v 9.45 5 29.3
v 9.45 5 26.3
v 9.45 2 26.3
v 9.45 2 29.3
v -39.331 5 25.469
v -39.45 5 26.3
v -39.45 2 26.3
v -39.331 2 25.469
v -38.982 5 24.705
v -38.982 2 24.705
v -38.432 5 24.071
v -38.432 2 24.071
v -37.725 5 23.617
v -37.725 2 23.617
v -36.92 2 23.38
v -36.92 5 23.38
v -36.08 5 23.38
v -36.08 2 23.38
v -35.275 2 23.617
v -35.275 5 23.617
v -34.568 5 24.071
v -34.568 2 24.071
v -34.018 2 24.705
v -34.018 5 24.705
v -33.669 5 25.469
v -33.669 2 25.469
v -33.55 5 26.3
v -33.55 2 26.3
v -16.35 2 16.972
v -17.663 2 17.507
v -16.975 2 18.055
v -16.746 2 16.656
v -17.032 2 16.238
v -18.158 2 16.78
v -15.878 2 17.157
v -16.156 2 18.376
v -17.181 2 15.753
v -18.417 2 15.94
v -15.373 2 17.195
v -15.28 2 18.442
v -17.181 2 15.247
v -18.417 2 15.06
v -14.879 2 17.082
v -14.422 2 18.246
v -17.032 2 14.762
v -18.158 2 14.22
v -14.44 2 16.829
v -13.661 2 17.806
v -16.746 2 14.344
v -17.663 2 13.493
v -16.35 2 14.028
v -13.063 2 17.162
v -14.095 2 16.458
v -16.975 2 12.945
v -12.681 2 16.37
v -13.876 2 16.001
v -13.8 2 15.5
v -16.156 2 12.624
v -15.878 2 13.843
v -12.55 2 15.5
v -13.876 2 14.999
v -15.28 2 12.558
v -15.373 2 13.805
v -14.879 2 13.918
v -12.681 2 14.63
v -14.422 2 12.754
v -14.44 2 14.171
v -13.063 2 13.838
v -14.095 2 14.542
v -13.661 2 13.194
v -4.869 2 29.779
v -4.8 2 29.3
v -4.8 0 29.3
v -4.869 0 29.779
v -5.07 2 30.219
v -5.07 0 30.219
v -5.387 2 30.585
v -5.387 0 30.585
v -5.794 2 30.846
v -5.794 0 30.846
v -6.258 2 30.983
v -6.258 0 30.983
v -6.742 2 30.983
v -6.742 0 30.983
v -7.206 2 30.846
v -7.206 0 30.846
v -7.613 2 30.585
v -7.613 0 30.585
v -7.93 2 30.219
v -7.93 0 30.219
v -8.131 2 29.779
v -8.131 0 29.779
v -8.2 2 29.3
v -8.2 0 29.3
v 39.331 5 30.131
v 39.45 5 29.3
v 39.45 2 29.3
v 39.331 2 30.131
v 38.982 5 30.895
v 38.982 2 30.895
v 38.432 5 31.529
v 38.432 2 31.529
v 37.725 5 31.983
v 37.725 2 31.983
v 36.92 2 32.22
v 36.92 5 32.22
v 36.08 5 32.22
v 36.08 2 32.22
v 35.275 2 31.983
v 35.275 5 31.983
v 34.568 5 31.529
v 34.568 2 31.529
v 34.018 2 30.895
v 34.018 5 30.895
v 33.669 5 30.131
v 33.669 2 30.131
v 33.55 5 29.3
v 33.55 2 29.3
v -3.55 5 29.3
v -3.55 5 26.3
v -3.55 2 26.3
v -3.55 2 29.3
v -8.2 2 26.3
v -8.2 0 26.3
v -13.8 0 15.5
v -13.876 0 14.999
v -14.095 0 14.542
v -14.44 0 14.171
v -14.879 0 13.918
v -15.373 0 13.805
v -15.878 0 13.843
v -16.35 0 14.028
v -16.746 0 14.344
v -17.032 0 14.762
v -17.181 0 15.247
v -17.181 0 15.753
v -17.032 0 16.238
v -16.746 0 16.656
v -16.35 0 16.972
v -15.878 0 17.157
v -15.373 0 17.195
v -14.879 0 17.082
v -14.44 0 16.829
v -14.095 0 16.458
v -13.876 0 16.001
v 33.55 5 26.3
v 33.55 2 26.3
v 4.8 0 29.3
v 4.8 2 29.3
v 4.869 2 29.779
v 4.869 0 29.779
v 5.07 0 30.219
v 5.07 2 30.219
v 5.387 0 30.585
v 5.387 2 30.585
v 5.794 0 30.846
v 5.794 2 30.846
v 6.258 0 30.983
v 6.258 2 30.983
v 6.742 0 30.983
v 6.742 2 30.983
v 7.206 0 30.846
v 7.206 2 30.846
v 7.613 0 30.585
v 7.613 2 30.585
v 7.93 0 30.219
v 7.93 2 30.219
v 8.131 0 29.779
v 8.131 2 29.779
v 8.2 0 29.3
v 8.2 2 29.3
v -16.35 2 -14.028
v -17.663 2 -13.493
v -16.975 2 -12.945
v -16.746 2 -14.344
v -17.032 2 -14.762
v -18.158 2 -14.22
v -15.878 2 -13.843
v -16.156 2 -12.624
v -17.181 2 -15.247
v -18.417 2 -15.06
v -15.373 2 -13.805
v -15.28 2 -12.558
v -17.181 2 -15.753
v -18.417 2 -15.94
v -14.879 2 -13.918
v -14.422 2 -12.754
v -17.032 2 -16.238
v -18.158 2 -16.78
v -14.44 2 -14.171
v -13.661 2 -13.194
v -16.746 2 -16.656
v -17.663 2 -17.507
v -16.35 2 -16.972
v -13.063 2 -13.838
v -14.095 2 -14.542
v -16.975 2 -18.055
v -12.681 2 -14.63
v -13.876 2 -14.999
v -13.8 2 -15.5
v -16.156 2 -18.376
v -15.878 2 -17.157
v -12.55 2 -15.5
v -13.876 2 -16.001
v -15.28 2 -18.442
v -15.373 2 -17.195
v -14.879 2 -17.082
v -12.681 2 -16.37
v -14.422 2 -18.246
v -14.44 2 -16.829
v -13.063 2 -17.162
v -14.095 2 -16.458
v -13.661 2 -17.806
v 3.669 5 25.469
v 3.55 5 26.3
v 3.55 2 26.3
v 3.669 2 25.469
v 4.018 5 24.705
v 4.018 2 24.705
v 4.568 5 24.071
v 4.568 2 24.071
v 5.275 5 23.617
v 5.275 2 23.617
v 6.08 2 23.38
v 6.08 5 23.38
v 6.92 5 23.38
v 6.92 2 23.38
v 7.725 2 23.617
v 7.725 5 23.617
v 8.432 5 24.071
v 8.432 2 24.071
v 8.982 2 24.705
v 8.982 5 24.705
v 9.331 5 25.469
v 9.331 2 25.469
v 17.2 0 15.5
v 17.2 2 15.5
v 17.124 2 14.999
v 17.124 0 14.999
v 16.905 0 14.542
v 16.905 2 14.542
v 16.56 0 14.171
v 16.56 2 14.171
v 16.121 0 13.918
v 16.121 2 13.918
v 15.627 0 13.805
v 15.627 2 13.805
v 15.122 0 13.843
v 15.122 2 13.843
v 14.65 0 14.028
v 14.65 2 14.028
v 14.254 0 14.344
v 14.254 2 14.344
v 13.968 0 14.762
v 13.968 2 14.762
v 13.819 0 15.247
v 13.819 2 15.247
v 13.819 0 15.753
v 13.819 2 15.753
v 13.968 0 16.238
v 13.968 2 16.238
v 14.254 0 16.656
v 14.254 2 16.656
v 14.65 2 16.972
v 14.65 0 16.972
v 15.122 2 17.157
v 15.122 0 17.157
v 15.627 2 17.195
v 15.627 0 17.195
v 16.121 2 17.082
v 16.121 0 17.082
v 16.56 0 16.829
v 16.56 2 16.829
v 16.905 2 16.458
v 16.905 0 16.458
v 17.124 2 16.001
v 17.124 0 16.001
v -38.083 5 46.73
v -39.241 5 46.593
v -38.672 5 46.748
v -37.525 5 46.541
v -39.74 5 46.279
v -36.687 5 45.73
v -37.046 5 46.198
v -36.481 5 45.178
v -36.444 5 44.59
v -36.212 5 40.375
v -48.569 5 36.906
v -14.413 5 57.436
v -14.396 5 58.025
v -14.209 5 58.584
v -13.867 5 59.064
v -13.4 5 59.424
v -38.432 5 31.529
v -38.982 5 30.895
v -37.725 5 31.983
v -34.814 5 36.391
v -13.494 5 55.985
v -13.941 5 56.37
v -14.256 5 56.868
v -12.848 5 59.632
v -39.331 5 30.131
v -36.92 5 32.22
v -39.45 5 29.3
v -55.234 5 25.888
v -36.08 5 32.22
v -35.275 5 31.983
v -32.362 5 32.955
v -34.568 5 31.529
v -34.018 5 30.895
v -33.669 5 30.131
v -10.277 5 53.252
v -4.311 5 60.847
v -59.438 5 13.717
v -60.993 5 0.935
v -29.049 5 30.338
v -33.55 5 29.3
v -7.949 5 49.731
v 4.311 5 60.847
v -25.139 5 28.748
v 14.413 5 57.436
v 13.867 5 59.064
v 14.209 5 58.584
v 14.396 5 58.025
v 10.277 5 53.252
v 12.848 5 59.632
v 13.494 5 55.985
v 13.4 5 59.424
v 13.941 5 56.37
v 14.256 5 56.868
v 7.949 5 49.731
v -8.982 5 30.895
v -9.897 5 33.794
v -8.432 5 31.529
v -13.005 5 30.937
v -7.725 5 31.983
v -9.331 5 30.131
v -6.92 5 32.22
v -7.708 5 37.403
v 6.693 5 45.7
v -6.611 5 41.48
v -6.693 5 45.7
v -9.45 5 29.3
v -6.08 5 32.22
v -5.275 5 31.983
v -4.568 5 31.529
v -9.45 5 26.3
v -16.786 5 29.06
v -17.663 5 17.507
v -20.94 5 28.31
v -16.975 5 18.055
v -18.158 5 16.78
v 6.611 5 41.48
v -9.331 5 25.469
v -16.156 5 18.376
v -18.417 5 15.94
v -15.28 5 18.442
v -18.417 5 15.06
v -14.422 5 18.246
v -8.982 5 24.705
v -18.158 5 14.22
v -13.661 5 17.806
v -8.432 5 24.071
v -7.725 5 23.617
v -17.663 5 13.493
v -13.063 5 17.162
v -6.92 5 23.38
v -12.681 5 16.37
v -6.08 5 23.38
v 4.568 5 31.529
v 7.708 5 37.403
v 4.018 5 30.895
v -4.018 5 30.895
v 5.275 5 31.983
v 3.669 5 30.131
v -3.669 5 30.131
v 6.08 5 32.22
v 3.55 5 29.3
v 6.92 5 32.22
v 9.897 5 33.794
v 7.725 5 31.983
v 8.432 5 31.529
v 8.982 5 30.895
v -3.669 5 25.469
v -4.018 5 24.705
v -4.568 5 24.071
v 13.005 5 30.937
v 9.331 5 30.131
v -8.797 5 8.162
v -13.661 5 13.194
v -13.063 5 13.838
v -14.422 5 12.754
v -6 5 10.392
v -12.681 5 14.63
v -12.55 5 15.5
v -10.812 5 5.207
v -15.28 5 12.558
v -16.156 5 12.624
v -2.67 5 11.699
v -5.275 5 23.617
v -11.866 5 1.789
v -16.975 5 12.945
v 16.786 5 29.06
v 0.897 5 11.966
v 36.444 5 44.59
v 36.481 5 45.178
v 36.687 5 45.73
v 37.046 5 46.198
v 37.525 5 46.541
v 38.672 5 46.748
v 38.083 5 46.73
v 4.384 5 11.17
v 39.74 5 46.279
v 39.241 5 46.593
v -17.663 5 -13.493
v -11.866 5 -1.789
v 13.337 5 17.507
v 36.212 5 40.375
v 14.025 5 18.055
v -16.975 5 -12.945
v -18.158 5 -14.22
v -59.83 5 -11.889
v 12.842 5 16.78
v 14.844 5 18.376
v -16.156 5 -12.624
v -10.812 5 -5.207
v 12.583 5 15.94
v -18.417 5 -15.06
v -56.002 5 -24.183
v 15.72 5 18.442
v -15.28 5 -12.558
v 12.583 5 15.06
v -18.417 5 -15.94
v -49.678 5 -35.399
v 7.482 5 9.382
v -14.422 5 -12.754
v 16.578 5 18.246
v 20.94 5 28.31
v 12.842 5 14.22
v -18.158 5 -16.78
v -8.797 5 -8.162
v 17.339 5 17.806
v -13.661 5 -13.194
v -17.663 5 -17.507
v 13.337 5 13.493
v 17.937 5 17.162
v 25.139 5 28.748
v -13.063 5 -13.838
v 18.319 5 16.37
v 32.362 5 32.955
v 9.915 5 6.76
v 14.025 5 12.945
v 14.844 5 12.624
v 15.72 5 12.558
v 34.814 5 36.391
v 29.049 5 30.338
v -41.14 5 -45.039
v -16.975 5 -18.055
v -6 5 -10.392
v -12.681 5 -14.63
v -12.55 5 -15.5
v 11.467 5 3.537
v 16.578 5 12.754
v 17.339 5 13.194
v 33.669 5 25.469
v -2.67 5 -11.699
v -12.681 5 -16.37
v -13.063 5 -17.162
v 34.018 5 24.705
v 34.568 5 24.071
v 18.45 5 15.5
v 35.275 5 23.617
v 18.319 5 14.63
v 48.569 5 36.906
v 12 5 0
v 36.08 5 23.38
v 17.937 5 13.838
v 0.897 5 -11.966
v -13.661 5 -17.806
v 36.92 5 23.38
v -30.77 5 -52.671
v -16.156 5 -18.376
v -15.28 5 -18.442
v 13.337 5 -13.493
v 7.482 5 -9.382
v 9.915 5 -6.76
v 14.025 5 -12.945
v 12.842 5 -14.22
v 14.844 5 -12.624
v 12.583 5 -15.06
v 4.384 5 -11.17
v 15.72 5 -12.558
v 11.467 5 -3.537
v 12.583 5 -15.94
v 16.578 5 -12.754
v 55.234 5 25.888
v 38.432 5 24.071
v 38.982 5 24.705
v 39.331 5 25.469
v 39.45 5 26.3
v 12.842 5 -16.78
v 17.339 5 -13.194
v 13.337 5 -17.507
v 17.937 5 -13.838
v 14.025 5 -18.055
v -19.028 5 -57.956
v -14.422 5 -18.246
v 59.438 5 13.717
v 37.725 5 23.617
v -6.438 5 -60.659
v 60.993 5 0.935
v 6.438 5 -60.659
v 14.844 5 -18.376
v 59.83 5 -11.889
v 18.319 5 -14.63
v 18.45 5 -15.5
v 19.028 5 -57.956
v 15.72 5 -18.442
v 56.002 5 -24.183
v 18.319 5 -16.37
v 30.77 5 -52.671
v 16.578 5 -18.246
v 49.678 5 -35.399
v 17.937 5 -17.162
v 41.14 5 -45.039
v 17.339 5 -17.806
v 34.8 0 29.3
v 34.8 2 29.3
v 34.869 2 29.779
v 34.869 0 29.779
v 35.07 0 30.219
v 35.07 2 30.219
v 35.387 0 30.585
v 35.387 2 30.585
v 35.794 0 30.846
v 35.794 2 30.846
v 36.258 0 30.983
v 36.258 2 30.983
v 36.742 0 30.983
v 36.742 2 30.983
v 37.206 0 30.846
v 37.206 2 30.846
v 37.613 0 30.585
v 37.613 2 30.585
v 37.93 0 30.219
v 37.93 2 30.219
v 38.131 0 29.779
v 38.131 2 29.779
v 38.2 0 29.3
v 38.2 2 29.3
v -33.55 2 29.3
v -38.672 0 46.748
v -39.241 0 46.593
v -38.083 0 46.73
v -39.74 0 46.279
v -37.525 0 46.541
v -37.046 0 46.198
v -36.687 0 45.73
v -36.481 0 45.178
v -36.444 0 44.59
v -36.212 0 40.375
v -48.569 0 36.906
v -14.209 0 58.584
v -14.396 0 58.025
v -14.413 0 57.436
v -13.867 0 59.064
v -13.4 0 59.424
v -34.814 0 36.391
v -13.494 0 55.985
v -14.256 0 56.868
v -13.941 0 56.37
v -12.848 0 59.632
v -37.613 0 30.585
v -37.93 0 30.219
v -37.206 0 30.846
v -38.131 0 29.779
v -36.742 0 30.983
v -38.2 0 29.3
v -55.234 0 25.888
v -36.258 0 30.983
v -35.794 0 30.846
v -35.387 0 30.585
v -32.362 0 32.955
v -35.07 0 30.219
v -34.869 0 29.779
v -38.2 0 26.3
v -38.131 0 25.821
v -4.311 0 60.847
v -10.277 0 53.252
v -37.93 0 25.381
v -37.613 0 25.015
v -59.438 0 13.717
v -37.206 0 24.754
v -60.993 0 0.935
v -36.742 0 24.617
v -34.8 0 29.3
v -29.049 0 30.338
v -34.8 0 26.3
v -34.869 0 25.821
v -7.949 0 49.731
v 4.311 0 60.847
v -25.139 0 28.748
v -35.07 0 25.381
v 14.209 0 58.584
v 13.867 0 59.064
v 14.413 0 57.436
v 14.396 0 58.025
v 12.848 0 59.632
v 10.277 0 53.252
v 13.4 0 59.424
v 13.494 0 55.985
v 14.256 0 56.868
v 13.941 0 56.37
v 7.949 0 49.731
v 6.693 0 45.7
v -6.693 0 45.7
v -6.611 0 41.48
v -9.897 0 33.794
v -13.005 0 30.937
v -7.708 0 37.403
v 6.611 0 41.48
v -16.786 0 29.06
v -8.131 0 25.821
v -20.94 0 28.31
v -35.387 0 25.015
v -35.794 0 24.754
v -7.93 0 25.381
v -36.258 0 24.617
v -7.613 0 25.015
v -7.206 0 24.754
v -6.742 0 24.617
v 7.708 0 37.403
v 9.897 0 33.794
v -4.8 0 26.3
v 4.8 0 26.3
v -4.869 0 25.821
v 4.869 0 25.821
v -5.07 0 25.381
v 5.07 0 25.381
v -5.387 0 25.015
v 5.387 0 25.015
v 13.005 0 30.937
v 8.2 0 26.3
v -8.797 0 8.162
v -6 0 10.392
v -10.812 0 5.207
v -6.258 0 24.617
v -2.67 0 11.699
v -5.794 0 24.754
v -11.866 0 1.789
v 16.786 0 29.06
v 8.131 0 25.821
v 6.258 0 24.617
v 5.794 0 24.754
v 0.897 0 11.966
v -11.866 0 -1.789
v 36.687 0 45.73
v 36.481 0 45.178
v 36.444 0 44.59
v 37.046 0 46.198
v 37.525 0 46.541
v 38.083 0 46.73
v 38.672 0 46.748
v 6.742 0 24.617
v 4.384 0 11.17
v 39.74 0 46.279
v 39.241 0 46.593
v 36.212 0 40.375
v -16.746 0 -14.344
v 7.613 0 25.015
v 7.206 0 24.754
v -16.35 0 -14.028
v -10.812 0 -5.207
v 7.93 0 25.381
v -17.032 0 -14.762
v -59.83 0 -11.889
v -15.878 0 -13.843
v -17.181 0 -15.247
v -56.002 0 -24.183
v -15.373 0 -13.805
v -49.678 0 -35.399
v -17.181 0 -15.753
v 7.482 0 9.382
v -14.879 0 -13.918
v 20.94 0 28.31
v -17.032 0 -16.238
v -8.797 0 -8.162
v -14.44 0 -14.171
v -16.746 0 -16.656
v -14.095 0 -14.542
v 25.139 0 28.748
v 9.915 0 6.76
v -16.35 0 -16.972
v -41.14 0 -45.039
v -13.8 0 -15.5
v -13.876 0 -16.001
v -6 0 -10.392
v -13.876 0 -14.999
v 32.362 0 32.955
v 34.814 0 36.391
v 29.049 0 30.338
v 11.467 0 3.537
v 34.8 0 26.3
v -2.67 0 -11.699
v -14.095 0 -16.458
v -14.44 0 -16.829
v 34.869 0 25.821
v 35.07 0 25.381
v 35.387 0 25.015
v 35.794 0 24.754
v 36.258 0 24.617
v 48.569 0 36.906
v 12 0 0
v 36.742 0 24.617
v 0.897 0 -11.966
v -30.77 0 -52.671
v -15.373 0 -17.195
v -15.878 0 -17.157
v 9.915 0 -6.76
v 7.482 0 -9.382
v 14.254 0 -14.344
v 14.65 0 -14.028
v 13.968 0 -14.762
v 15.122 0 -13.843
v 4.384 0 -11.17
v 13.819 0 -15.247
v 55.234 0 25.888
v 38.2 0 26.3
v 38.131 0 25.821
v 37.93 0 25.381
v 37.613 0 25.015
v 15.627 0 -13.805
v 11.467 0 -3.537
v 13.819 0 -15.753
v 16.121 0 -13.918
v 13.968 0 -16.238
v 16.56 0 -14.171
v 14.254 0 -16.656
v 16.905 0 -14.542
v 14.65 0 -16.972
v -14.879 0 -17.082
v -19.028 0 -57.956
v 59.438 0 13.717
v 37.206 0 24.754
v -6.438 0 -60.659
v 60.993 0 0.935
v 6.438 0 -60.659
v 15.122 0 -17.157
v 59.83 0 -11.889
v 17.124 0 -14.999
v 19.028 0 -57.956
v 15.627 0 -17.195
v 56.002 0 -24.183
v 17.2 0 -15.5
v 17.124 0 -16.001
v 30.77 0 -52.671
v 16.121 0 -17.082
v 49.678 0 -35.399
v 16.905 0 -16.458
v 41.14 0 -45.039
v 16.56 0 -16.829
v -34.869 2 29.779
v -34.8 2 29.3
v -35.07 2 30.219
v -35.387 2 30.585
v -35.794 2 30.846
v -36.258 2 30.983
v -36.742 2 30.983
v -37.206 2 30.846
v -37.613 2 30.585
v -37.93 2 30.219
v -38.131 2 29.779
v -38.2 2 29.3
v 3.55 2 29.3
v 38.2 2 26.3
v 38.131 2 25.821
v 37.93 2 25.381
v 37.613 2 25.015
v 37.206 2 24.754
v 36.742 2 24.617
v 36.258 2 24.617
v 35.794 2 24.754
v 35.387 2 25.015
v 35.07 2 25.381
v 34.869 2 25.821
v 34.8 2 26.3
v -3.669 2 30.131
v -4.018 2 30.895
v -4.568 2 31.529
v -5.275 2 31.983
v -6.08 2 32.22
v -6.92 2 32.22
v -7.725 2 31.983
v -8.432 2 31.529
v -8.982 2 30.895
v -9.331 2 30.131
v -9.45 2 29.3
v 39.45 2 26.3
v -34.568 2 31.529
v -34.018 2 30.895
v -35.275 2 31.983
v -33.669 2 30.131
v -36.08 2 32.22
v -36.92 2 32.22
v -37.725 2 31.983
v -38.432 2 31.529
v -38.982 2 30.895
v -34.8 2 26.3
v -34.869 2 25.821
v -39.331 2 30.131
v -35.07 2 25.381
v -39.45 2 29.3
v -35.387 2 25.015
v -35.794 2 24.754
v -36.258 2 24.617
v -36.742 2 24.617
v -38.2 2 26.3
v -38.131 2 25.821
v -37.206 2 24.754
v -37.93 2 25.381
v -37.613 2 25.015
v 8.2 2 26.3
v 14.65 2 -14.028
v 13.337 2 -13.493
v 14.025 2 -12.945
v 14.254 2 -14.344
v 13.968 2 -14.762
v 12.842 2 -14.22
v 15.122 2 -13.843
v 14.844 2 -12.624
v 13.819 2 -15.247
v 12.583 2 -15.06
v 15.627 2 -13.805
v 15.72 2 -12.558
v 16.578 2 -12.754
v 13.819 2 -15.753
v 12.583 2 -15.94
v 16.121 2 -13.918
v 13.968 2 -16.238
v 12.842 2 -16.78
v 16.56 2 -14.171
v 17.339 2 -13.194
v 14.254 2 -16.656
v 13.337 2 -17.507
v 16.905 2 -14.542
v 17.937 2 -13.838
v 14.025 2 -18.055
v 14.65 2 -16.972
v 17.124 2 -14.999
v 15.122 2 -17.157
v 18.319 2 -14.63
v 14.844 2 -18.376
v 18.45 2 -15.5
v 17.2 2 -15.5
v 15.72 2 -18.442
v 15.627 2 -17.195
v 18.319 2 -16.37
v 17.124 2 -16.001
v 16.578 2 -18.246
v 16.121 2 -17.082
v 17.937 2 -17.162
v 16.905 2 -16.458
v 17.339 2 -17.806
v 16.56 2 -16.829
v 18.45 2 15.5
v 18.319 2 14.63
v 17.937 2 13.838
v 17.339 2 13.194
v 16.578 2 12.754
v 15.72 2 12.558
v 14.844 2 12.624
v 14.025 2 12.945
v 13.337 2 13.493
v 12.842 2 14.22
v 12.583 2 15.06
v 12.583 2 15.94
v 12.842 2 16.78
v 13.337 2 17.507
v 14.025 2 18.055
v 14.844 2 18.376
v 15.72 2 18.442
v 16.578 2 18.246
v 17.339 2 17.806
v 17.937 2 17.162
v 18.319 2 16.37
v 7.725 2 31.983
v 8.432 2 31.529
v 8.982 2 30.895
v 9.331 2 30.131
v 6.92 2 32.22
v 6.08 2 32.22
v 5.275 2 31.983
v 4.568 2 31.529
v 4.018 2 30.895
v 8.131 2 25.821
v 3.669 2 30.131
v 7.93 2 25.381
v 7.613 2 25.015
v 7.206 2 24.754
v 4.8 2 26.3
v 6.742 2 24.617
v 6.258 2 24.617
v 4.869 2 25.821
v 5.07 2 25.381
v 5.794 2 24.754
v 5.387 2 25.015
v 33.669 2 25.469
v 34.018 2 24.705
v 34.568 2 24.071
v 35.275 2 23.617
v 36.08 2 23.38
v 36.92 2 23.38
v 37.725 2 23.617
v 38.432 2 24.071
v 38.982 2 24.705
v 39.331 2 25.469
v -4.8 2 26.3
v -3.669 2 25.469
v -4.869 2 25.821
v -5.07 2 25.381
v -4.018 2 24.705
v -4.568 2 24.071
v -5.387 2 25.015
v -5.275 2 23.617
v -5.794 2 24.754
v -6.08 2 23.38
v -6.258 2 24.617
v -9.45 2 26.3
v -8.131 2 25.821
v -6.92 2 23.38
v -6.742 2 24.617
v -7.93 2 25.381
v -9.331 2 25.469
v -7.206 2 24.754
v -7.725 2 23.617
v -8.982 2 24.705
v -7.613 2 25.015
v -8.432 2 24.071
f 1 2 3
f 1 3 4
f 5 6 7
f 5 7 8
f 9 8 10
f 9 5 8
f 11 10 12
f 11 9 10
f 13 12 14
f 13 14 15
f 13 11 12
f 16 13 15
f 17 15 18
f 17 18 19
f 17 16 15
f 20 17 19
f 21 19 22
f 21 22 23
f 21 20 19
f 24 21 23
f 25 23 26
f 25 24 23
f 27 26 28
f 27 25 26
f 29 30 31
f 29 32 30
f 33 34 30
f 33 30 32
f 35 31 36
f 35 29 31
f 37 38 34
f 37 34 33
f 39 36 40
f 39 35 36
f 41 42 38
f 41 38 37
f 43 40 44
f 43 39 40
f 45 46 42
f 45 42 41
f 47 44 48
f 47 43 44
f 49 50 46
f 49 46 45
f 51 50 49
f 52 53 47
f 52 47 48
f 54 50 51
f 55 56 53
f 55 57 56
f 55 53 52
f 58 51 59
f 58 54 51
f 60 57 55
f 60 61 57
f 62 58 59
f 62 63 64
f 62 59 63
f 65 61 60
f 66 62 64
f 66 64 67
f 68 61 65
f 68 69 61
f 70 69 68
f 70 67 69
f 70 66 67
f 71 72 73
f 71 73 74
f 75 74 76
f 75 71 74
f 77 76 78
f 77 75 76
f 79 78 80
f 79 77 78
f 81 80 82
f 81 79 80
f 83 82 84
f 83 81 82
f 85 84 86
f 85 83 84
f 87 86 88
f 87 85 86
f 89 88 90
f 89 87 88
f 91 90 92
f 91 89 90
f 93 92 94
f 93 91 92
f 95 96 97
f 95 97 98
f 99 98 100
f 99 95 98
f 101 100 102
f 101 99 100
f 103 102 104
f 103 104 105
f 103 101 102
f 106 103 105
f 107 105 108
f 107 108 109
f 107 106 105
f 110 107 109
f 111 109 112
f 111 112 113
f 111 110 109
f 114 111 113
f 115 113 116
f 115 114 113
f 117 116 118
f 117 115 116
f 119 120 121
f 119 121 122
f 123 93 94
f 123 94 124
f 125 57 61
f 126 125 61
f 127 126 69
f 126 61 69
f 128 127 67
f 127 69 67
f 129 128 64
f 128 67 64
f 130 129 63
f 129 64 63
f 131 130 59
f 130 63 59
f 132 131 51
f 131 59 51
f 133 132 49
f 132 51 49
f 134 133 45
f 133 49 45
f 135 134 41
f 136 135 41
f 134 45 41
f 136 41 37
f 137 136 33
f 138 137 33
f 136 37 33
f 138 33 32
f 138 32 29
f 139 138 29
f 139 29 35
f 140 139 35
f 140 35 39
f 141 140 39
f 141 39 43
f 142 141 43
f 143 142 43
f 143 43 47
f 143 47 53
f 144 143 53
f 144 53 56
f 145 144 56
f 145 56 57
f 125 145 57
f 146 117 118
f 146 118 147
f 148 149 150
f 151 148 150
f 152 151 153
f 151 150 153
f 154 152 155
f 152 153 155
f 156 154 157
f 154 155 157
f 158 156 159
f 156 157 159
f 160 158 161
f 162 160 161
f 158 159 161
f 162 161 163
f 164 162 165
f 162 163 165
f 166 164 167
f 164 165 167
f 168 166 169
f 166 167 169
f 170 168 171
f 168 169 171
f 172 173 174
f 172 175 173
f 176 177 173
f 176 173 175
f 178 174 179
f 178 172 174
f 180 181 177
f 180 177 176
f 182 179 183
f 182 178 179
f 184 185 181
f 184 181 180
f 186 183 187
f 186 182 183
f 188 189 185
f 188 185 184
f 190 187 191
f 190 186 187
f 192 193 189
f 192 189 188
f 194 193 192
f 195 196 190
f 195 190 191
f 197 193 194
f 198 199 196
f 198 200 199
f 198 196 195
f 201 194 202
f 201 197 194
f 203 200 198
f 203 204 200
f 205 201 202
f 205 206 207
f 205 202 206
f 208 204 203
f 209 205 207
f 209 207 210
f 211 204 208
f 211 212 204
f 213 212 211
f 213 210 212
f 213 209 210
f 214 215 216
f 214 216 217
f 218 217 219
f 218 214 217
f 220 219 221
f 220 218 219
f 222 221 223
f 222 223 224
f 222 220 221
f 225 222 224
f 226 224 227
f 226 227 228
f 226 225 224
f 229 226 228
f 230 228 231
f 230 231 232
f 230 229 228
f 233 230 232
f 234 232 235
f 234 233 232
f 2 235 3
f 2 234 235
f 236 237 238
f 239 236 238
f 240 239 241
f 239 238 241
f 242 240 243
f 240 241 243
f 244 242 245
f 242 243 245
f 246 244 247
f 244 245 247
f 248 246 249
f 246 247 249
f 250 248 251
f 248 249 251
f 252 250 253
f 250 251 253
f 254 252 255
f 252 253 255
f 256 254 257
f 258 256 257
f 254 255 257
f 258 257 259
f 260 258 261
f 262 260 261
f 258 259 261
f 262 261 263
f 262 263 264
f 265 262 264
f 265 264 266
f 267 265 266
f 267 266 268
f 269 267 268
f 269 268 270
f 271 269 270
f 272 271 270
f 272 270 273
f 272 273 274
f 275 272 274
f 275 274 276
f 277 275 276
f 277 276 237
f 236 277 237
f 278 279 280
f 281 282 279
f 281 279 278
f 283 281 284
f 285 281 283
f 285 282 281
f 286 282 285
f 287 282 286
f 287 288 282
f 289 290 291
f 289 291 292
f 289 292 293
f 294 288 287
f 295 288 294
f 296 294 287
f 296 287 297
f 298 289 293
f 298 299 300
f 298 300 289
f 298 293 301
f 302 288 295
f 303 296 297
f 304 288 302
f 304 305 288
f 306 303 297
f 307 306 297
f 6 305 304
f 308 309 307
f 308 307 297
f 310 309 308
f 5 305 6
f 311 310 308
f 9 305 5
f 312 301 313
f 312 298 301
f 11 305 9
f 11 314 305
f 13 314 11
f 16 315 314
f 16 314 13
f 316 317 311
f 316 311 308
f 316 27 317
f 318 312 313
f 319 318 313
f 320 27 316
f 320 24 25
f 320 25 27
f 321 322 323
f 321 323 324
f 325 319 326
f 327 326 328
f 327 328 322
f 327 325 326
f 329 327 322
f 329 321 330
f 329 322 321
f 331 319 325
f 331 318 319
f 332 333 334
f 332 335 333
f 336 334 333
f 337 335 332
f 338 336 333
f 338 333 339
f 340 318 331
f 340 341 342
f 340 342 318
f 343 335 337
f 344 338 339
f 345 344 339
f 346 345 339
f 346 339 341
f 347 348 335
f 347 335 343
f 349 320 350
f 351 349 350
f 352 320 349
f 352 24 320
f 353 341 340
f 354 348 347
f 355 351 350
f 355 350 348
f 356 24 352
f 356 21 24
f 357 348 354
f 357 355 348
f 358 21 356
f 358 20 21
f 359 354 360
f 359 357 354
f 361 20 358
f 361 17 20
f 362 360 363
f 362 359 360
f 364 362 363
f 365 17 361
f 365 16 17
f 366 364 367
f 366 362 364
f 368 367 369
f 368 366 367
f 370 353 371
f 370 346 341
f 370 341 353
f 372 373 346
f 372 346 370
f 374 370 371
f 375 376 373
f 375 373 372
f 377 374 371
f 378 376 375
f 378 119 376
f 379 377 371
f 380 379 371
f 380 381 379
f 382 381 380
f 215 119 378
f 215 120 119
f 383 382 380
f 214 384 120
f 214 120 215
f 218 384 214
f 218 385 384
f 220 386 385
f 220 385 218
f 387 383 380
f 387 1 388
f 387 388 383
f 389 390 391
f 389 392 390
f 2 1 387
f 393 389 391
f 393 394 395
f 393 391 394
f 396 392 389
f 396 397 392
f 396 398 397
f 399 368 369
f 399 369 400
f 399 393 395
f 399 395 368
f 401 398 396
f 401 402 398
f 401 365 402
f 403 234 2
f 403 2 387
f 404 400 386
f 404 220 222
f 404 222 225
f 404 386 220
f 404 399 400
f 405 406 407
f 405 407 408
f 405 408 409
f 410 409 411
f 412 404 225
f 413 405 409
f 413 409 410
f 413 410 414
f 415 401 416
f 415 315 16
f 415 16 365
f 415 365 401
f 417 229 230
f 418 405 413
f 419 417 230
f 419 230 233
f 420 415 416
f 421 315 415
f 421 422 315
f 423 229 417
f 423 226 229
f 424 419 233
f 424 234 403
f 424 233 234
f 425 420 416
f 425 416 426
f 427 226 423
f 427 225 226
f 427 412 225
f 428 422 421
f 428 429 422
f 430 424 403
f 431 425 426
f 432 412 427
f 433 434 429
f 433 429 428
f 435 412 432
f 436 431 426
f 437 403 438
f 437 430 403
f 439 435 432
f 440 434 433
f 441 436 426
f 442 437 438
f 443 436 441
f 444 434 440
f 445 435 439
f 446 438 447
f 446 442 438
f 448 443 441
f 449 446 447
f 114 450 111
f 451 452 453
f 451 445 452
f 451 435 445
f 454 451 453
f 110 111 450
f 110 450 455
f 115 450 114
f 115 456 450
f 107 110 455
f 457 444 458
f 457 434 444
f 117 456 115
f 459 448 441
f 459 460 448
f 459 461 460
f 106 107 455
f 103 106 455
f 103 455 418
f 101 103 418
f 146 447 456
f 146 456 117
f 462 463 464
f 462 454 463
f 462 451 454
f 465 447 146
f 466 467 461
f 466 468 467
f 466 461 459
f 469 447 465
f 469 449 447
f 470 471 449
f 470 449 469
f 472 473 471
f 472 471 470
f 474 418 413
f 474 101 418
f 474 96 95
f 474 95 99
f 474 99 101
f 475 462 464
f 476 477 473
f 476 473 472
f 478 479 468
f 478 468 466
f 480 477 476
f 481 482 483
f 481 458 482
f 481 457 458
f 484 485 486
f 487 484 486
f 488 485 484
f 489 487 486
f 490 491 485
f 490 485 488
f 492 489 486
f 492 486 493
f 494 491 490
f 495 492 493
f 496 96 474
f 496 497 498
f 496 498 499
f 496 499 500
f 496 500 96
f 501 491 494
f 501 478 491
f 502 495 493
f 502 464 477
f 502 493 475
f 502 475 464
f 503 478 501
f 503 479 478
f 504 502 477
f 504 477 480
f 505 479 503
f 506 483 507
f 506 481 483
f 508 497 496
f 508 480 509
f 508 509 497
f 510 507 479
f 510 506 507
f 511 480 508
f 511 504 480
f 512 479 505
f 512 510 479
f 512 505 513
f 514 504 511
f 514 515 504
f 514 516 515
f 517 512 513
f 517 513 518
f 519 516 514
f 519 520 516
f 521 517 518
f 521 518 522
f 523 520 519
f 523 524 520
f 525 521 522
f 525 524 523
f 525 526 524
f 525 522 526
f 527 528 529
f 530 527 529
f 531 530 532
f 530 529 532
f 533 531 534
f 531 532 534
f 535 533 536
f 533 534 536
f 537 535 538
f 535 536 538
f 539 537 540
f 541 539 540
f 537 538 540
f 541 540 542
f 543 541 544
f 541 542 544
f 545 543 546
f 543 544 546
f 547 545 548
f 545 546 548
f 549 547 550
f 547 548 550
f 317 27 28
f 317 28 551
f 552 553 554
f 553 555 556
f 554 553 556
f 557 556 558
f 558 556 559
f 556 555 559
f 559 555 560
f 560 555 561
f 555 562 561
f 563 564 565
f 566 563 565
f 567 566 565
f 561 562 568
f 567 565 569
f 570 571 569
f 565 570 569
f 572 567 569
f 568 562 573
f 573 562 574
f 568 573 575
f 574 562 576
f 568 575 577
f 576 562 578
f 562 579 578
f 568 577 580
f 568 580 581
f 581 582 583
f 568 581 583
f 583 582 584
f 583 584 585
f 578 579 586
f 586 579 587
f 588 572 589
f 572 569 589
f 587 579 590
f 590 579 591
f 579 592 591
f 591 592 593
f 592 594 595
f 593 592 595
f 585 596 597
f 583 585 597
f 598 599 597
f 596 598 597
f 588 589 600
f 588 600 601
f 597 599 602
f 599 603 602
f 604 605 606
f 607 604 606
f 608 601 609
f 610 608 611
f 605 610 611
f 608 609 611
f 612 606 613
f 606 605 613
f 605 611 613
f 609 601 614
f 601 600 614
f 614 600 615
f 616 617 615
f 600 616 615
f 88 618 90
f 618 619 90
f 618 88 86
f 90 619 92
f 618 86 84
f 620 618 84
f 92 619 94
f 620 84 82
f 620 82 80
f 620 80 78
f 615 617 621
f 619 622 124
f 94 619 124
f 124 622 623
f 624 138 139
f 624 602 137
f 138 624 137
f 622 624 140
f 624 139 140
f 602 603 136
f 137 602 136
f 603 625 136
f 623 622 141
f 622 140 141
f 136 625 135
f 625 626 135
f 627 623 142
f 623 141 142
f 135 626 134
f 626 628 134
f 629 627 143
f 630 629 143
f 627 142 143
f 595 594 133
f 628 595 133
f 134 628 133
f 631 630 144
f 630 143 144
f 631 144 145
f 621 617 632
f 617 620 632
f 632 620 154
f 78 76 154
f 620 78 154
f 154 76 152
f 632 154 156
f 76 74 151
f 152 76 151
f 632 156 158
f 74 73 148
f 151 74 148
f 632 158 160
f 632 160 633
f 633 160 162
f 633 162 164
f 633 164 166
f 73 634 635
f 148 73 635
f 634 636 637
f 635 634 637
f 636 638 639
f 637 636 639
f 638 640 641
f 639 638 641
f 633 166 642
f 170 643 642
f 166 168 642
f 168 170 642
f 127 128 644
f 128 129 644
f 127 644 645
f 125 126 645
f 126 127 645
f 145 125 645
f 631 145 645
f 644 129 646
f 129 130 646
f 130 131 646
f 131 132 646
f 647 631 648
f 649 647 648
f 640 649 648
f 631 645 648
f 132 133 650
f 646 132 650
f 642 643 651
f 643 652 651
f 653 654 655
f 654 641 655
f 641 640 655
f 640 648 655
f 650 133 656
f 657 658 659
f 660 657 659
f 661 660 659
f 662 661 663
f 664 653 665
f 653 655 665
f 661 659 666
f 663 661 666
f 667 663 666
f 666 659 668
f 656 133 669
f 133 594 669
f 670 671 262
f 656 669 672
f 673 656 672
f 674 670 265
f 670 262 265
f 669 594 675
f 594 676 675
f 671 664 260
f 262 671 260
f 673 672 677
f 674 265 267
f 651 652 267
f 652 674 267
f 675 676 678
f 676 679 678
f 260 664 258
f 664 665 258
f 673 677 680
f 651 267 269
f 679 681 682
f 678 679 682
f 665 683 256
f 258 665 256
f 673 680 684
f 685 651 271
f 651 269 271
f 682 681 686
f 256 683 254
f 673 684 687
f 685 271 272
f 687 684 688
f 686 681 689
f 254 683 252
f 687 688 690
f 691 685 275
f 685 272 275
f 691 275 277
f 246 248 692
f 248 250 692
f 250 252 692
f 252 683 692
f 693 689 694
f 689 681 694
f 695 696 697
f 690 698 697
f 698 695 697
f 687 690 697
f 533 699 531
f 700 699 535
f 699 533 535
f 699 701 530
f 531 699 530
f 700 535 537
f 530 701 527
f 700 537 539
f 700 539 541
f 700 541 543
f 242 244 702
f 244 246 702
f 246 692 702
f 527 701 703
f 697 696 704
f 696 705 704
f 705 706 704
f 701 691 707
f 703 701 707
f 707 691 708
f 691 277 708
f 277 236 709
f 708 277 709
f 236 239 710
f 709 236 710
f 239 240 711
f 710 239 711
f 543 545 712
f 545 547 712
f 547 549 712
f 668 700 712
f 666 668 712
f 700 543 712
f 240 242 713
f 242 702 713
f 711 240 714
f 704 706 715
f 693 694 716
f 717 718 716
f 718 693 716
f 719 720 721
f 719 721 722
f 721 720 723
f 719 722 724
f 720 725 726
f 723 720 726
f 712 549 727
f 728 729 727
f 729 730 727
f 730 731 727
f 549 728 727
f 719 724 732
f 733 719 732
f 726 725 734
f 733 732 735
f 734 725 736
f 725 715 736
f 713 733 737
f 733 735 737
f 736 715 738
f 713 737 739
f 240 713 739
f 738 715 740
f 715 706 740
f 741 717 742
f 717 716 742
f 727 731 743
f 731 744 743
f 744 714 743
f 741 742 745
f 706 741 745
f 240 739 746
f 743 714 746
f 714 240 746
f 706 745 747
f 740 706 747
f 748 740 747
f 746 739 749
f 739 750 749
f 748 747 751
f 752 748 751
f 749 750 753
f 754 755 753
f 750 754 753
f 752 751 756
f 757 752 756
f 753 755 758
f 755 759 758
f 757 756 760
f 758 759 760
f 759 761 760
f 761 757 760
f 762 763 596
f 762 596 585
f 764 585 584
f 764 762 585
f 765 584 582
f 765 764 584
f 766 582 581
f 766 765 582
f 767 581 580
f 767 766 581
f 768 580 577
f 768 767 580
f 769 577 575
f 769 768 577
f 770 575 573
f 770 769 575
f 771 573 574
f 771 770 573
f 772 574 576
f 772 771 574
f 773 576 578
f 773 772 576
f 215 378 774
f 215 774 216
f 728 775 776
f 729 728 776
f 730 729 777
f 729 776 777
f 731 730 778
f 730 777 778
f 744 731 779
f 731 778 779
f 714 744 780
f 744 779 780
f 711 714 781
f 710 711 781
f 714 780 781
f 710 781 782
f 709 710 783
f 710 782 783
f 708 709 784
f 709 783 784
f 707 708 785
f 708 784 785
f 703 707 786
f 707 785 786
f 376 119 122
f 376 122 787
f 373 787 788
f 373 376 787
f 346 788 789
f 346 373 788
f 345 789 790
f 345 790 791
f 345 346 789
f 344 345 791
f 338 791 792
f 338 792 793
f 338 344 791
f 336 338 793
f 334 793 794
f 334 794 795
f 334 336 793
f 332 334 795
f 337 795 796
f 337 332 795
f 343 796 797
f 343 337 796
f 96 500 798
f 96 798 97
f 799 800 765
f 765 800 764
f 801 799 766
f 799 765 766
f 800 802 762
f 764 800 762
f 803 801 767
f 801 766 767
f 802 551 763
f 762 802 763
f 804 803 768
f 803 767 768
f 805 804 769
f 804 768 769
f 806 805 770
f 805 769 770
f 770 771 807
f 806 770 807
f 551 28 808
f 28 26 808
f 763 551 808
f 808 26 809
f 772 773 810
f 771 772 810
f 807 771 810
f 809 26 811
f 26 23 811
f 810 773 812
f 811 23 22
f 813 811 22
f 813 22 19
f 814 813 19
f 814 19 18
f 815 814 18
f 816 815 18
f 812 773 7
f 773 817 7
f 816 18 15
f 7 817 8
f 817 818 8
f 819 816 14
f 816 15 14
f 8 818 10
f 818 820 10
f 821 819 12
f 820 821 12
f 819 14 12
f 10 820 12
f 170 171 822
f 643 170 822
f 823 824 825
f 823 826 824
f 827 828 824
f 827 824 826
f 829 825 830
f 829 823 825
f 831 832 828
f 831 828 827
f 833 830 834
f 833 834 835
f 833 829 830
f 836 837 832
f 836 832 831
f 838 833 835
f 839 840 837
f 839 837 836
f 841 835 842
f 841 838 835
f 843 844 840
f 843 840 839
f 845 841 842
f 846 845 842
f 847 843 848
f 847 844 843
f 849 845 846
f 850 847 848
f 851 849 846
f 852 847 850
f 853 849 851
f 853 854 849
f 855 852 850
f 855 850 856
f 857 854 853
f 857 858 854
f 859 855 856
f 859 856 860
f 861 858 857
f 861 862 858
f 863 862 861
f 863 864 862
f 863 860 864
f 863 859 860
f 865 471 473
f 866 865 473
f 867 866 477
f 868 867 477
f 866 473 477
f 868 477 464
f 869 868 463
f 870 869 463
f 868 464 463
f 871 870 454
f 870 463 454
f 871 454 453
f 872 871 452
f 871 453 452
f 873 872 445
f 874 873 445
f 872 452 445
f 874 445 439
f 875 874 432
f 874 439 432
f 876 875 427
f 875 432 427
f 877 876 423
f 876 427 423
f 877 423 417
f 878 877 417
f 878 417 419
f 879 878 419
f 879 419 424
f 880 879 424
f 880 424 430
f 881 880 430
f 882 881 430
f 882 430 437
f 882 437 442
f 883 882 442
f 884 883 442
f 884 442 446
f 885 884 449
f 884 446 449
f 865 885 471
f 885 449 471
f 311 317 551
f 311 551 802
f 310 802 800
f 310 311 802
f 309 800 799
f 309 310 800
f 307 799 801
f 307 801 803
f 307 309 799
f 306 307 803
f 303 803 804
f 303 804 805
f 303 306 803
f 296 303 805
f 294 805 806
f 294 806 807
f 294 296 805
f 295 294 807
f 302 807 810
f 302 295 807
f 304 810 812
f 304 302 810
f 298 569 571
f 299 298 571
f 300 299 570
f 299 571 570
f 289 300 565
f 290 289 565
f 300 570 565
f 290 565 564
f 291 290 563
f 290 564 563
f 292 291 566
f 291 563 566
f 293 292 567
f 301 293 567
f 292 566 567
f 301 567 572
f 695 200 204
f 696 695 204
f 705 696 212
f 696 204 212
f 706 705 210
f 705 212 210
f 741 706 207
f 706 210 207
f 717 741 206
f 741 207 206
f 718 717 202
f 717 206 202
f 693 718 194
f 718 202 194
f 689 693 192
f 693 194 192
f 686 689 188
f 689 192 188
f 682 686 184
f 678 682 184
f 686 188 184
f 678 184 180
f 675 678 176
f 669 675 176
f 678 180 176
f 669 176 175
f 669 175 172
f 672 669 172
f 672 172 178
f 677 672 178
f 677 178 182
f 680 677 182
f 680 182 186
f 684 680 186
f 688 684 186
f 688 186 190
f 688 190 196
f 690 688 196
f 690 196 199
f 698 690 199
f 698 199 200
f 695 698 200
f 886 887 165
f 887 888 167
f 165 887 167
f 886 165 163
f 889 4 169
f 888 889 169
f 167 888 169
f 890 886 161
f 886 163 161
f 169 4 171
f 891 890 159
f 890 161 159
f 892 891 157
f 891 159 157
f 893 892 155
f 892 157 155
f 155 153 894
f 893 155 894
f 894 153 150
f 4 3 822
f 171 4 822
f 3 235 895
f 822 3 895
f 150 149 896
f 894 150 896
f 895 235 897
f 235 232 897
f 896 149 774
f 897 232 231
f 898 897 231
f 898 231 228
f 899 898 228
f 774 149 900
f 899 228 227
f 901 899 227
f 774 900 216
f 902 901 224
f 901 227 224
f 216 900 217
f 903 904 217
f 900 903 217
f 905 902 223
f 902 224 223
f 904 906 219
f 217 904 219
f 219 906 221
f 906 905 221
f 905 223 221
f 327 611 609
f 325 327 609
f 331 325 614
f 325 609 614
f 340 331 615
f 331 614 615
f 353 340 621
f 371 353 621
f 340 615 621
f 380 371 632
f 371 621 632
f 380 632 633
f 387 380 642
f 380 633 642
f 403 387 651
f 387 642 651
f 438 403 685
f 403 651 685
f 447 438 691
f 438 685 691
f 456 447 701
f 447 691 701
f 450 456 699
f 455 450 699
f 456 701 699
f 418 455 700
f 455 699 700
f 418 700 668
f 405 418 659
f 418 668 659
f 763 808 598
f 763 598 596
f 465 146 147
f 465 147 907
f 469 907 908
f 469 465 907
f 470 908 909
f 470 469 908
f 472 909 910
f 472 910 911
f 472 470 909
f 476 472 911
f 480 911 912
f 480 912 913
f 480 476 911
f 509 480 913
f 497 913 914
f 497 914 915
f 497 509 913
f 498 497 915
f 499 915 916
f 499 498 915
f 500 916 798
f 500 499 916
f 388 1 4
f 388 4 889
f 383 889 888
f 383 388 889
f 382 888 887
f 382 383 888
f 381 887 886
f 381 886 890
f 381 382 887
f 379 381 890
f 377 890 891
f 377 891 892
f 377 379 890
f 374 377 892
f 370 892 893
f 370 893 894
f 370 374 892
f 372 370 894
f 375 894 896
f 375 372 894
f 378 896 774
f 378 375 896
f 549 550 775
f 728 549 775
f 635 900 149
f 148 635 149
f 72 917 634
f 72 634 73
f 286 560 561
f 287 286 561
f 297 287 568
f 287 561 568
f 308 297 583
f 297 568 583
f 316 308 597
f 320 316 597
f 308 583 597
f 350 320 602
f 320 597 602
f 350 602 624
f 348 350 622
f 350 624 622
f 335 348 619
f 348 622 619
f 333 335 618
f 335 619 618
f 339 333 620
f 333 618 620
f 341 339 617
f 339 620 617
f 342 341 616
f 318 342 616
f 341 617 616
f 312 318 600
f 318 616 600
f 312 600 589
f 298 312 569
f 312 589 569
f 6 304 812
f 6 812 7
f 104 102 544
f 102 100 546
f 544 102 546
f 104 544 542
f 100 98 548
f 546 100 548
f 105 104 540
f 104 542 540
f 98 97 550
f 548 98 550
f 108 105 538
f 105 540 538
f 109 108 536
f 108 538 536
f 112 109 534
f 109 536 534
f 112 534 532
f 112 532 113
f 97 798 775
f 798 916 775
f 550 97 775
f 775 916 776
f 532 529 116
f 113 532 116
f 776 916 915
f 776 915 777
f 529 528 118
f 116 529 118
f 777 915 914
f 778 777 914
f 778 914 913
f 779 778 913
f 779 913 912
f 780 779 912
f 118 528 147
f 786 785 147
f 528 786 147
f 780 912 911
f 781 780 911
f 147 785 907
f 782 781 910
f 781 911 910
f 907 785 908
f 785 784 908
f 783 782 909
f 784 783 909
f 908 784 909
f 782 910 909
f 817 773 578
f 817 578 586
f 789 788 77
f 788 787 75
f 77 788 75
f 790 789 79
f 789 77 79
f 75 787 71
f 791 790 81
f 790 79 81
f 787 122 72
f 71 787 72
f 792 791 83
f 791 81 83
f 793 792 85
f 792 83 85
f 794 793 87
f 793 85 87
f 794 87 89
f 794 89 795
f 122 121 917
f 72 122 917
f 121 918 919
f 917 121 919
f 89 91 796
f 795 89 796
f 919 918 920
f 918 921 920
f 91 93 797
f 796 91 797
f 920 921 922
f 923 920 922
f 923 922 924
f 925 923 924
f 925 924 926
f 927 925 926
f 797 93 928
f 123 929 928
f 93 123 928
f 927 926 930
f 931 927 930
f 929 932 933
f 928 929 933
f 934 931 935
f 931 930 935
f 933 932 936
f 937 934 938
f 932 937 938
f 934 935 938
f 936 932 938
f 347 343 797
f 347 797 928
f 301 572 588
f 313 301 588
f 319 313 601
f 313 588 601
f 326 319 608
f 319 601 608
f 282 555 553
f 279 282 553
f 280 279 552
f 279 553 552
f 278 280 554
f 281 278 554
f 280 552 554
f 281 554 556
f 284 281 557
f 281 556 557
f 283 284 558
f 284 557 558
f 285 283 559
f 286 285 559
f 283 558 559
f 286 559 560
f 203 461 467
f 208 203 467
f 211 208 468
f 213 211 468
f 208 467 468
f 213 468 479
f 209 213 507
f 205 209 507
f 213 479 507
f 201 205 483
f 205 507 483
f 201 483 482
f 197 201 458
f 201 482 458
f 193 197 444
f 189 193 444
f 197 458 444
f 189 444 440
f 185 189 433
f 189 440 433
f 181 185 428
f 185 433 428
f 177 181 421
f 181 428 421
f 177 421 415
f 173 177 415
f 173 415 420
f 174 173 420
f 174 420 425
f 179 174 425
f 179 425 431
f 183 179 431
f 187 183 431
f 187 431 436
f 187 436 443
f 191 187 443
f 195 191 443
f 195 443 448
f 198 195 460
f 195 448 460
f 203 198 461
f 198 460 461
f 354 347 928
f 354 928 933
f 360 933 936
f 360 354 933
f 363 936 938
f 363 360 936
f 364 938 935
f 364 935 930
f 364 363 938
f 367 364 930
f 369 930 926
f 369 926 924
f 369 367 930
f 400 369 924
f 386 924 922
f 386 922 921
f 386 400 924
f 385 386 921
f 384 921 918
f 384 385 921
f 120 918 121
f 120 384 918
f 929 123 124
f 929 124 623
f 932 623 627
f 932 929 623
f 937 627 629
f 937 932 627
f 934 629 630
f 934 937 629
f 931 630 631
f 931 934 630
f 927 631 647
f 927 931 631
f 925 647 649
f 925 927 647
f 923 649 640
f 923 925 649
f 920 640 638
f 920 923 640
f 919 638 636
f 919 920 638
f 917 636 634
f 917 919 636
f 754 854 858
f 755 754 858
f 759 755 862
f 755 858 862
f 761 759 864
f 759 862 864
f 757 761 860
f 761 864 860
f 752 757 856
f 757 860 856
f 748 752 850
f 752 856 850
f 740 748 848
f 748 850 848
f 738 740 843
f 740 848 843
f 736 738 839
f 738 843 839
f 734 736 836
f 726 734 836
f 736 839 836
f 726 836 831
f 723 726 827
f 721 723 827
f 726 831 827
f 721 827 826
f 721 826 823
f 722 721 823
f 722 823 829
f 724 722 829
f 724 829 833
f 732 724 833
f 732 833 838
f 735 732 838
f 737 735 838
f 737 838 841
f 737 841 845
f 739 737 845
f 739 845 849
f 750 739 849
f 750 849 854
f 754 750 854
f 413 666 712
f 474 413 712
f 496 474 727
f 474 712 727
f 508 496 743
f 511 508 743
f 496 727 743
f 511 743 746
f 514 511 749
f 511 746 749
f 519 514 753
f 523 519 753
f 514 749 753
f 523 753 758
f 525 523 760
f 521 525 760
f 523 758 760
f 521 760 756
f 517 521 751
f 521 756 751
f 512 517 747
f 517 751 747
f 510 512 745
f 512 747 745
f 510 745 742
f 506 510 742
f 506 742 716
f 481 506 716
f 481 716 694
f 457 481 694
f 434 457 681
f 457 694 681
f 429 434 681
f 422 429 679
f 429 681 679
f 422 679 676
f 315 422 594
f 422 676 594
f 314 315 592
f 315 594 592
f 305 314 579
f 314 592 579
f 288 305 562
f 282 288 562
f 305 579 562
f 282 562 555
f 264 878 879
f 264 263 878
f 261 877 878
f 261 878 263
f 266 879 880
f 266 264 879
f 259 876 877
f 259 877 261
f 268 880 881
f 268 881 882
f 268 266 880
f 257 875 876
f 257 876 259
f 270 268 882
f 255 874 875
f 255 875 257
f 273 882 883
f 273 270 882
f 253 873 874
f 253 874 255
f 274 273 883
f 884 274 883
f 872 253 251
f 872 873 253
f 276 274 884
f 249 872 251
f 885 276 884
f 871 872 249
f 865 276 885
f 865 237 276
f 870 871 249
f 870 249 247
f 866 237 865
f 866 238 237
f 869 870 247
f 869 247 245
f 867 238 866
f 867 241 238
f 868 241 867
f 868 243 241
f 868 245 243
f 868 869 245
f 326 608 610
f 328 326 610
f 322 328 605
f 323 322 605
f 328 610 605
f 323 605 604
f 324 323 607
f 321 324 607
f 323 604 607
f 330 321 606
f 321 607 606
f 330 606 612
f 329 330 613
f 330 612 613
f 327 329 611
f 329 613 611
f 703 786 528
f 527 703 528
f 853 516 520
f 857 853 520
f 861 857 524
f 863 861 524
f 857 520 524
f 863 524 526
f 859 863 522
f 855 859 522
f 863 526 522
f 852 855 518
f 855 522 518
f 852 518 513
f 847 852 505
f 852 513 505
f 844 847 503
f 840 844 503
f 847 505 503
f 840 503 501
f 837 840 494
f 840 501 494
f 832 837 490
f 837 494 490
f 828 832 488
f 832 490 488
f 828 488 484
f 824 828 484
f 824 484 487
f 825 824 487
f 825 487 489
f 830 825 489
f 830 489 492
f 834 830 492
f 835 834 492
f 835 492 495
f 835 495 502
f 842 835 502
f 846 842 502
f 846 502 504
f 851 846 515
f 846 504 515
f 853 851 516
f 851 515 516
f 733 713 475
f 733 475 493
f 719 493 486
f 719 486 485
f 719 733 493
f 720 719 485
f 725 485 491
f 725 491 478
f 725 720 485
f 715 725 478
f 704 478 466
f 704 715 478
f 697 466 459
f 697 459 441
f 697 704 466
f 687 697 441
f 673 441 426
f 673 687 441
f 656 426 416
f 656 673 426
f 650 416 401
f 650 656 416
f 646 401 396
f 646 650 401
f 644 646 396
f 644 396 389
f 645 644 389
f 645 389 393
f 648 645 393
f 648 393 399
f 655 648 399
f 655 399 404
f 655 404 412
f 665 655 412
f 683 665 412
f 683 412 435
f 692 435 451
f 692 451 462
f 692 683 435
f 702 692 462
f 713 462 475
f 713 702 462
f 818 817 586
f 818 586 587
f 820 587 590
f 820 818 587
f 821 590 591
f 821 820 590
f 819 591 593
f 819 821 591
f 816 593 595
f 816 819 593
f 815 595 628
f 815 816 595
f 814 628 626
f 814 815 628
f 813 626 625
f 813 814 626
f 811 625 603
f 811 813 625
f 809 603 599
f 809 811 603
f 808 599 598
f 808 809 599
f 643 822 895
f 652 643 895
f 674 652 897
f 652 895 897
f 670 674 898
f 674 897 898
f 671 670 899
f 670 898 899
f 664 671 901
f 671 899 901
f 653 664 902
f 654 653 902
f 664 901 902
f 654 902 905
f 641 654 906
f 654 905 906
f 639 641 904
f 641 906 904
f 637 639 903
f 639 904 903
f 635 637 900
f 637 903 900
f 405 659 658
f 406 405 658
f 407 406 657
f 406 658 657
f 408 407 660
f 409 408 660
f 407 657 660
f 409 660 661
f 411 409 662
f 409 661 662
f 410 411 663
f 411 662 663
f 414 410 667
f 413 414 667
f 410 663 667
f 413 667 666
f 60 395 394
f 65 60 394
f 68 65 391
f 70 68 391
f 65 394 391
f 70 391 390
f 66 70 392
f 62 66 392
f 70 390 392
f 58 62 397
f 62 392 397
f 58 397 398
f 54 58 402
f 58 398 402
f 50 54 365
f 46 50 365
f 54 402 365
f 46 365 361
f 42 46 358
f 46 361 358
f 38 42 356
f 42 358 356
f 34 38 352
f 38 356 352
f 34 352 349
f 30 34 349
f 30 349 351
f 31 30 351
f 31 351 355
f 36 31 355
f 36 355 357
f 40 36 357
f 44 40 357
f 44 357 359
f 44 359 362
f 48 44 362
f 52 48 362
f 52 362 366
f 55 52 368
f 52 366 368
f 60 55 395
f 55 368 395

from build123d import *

# Parameters (mm, degrees)
CROQUIS1_R              = 12
SALIENTE_EXTRUIR1_DEPTH = 5
CROQUIS2_R              = 1.7
CORTAR_EXTRUIR1_DEPTH   = 5
CROQUIS3_R              = 2.95
CORTAR_EXTRUIR2_DEPTH   = 3


with BuildPart() as part:
    # Croquis1 → Saliente-Extruir1 (new body)
    with BuildSketch(Plane(origin=(0, 0, 0), x_dir=(1, 0, 0), z_dir=(0, 1, 0))):
        with BuildLine():
            ThreePointArc((-12.848290026, -59.631547384), (0, -61), (12.848290026, -59.631547384))
            ThreePointArc((12.848290026, -59.631547384), (14.396355702, -58.025376654), (13.494442308, -55.985071779))
            ThreePointArc((13.494442308, -55.985071779), (14.829055081, -29.865027209), (36.444464672, -44.589564139))
            ThreePointArc((36.444464672, -44.589564139), (37.524744291, -46.541303798), (39.740011147, -46.278845211))
            ThreePointArc((39.740011147, -46.278845211), (0, 61), (-39.740011147, -46.278845211))
            ThreePointArc((-39.740011147, -46.278845211), (-37.524744291, -46.541303798), (-36.444464672, -44.589564139))
            ThreePointArc((-36.444464672, -44.589564139), (-14.829055081, -29.865027209), (-13.494442308, -55.985071779))
            ThreePointArc((-13.494442308, -55.985071779), (-14.396355702, -58.025376654), (-12.848290026, -59.631547384))
        make_face()
        Circle(CROQUIS1_R, mode=Mode.SUBTRACT)
    extrude(amount=SALIENTE_EXTRUIR1_DEPTH)

    # Croquis2 → Cortar-Extruir1 (cut)
    with BuildSketch(Plane(origin=(0, 5, 0), x_dir=(1, 0, 0), z_dir=(0, 1, 0))):
        with Locations((-15.5, 15.5)):
            Circle(CROQUIS2_R)
        with Locations((-15.5, -15.5)):
            Circle(CROQUIS2_R)
        with Locations((15.5, -15.5)):
            Circle(CROQUIS2_R)
        with Locations((15.5, 15.5)):
            Circle(CROQUIS2_R)
        with BuildLine():
            Line((-34.8, -26.3), (-34.8, -29.3))
            ThreePointArc((-34.8, -29.3), (-36.5, -31), (-38.2, -29.3))
            Line((-38.2, -29.3), (-38.2, -26.3))
            ThreePointArc((-38.2, -26.3), (-36.5, -24.6), (-34.8, -26.3))
        make_face()
        with BuildLine():
            Line((-4.8, -26.3), (-4.8, -29.3))
            ThreePointArc((-4.8, -29.3), (-6.5, -31), (-8.2, -29.3))
            Line((-8.2, -29.3), (-8.2, -26.3))
            ThreePointArc((-8.2, -26.3), (-6.5, -24.6), (-4.8, -26.3))
        make_face()
        with BuildLine():
            Line((4.8, -26.3), (4.8, -29.3))
            ThreePointArc((4.8, -29.3), (6.5, -31), (8.2, -29.3))
            Line((8.2, -29.3), (8.2, -26.3))
            ThreePointArc((8.2, -26.3), (6.5, -24.6), (4.8, -26.3))
        make_face()
        with BuildLine():
            Line((34.8, -26.3), (34.8, -29.3))
            ThreePointArc((34.8, -29.3), (36.5, -31), (38.2, -29.3))
            Line((38.2, -29.3), (38.2, -26.3))
            ThreePointArc((38.2, -26.3), (36.5, -24.6), (34.8, -26.3))
        make_face()
    extrude(amount=-CORTAR_EXTRUIR1_DEPTH, mode=Mode.SUBTRACT)

    # Croquis3 → Cortar-Extruir2 (cut)
    with BuildSketch(Plane(origin=(0, 5, 0), x_dir=(1, 0, 0), z_dir=(0, 1, 0))):
        with Locations((-15.5, 15.5)):
            Circle(CROQUIS3_R)
        with Locations((15.5, 15.5)):
            Circle(CROQUIS3_R)
        with Locations((15.5, -15.5)):
            Circle(CROQUIS3_R)
        with Locations((-15.5, -15.5)):
            Circle(CROQUIS3_R)
        with BuildLine():
            Line((-33.55, -26.3), (-33.55, -29.3))
            ThreePointArc((-33.55, -29.3), (-36.5, -32.25), (-39.45, -29.3))
            Line((-39.45, -29.3), (-39.45, -26.3))
            ThreePointArc((-39.45, -26.3), (-36.5, -23.35), (-33.55, -26.3))
        make_face()
        with BuildLine():
            Line((-3.55, -26.3), (-3.55, -29.3))
            ThreePointArc((-3.55, -29.3), (-6.5, -32.25), (-9.45, -29.3))
            Line((-9.45, -29.3), (-9.45, -26.3))
            ThreePointArc((-9.45, -26.3), (-6.5, -23.35), (-3.55, -26.3))
        make_face()
        with BuildLine():
            Line((9.45, -26.3), (9.45, -29.3))
            ThreePointArc((9.45, -29.3), (6.5, -32.25), (3.55, -29.3))
            Line((3.55, -29.3), (3.55, -26.3))
            ThreePointArc((3.55, -26.3), (6.5, -23.35), (9.45, -26.3))
        make_face()
        with BuildLine():
            Line((39.45, -26.3), (39.45, -29.3))
            ThreePointArc((39.45, -29.3), (36.5, -32.25), (33.55, -29.3))
            Line((33.55, -29.3), (33.55, -26.3))
            ThreePointArc((33.55, -26.3), (36.5, -23.35), (39.45, -26.3))
        make_face()
    extrude(amount=-CORTAR_EXTRUIR2_DEPTH, mode=Mode.SUBTRACT)


solid = part.part
